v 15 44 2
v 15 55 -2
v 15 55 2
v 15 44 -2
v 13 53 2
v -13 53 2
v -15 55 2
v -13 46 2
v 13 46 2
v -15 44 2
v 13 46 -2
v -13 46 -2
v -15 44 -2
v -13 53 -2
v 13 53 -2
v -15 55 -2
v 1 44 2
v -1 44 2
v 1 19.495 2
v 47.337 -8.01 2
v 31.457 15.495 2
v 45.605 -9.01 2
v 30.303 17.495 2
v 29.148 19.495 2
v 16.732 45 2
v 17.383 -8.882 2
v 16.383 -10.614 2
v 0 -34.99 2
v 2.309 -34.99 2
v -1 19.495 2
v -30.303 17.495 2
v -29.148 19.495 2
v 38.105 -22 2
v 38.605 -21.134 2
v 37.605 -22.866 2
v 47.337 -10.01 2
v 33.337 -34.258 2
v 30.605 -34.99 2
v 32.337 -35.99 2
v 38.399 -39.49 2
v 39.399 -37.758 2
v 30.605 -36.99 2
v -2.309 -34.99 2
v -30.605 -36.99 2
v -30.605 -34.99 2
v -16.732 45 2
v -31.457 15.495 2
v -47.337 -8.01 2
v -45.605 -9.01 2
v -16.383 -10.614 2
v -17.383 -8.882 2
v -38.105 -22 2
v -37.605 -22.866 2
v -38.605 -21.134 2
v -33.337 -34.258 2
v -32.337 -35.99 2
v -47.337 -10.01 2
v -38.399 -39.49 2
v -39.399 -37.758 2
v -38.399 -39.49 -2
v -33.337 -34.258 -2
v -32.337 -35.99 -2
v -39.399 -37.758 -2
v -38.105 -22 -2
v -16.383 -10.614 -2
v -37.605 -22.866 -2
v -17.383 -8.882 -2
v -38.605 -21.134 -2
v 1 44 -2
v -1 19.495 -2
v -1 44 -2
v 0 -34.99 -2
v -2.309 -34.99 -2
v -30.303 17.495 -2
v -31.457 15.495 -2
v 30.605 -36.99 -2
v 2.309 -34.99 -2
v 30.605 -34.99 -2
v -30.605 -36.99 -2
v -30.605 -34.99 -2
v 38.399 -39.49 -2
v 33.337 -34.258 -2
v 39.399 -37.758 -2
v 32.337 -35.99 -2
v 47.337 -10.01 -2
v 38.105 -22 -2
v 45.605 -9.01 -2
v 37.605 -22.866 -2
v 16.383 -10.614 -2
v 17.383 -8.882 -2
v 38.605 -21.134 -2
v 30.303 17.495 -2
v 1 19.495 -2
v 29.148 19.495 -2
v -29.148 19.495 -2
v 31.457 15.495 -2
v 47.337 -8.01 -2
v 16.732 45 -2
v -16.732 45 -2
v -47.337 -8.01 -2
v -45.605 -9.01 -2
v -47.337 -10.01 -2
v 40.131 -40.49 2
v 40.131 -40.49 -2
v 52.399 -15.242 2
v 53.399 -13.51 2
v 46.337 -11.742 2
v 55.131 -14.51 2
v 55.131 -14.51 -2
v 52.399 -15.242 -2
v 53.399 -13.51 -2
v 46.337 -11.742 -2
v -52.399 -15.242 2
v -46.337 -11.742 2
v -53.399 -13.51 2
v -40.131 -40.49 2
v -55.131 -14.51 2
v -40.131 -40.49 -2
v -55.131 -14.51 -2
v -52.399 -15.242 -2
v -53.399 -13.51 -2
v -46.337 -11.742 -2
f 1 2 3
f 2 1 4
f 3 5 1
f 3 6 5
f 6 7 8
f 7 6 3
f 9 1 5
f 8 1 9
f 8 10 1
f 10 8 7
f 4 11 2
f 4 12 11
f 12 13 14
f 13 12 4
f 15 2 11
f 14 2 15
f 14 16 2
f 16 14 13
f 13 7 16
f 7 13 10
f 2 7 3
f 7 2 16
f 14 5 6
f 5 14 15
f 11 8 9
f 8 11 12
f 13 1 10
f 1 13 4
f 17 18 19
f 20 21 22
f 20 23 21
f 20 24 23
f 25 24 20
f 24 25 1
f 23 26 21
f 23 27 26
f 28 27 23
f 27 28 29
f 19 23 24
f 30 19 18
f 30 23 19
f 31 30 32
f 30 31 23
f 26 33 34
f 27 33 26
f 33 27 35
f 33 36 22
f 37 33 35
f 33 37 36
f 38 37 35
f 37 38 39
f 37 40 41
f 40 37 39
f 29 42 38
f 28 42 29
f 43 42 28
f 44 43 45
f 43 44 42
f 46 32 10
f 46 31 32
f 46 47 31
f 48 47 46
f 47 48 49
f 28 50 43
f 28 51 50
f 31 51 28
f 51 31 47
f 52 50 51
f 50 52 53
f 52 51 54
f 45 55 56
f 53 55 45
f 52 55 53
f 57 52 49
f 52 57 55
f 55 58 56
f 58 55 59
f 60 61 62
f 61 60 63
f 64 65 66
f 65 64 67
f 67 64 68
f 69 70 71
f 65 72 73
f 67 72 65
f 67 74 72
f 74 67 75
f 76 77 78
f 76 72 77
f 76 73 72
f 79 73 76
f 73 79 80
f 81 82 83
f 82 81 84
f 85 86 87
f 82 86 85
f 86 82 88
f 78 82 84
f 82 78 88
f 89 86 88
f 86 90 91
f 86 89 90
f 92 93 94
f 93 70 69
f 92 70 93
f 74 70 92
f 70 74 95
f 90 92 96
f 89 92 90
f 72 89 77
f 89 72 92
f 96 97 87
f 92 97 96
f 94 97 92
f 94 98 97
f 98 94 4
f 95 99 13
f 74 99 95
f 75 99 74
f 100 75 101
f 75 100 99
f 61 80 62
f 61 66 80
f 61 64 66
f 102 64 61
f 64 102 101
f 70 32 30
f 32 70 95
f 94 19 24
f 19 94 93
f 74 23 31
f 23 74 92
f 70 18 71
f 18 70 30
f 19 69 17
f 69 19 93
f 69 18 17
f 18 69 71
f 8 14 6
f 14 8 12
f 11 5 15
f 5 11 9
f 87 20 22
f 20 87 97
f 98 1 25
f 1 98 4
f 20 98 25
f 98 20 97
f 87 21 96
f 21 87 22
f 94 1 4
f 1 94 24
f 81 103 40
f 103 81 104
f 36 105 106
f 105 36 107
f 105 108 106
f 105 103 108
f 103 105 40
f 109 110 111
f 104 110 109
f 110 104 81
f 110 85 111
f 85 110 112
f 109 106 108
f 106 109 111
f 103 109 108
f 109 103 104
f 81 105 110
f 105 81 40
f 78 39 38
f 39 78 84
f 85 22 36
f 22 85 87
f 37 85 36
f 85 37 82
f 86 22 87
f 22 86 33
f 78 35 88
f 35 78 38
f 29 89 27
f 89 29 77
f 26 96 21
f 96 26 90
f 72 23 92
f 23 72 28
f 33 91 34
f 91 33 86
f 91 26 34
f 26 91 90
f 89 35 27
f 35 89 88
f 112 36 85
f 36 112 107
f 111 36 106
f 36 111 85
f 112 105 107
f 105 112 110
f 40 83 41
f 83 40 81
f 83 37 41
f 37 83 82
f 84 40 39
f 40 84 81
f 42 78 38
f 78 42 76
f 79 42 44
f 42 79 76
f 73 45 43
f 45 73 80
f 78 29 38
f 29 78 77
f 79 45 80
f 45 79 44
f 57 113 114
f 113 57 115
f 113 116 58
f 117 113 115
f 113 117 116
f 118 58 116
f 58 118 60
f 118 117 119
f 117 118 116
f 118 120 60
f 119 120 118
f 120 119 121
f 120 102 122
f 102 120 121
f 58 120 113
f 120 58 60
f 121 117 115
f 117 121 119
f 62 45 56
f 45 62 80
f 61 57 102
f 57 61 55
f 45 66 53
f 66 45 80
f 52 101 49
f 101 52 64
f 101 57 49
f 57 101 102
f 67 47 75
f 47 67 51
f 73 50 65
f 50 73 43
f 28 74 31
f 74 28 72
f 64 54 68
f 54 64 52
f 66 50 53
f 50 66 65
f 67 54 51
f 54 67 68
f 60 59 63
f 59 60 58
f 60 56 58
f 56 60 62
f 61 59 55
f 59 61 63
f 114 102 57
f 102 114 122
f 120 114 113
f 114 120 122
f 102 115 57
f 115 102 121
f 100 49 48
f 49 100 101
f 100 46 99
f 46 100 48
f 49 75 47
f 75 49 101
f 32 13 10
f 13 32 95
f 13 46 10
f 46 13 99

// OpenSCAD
// Generated by SolidPython 1.1.3 on 2023-10-16 15:38:50
$fn = 48;


union() {
	union() {
		color(alpha = 1.0000000000, c = "Red") {
			translate(v = [ 0.,54., 0.]) {
				rotate(a = [0, 0, -0.0000000000]) {
					cube(center = true, size = [30, 2, 4]);
				}
			}
		}
	}
	union() {
		color(alpha = 1.0000000000, c = "Orange") {
			translate(v = [ 0.,45., 0.]) {
				rotate(a = [0, 0, -0.0000000000]) {
					cube(center = true, size = [30, 2, 4]);
				}
			}
		}
	}
	union() {
		color(alpha = 1.0000000000, c = "Yellow") {
			translate(v = [ 0.        ,18.49519053, 0.        ]) {
				rotate(a = [0, 0, -0.0000000000]) {
					cube(center = true, size = [60.605117766515306, 2, 4]);
				}
			}
		}
	}
	union() {
		color(alpha = 1.0000000000, c = "Green") {
			translate(v = [ 0.        ,31.74759526, 0.        ]) {
				rotate(a = [0, 0, 90.0000000000]) {
					cube(center = true, size = [24.504809471616706, 2, 4]);
				}
			}
		}
	}
	union() {
		color(alpha = 1.0000000000, c = "Blue") {
			translate(v = [-14. , 49.5,  0. ]) {
				rotate(a = [0, 0, 90.0000000000]) {
					cube(center = true, size = [7, 2, 4]);
				}
			}
		}
	}
	union() {
		color(alpha = 1.0000000000, c = "Blue") {
			translate(v = [14. ,49.5, 0. ]) {
				rotate(a = [0, 0, 90.0000000000]) {
					cube(center = true, size = [7, 2, 4]);
				}
			}
		}
	}
	union() {
		color(alpha = 1.0000000000, c = "Purple") {
			translate(v = [31.16858429,17.99519053, 0.        ]) {
				rotate(a = [0, 0, -60.0000000000]) {
					cube(center = true, size = [61.2102355330306, 2, 4]);
				}
			}
		}
	}
	union() {
		color(alpha = 1.0000000000, c = "Red") {
			translate(v = [ 46.7653718,-27.       ,  0.       ]) {
				rotate(a = [0, 0, -120.0000000000]) {
					cube(center = true, size = [30, 2, 4]);
				}
			}
		}
	}
	union() {
		color(alpha = 1.0000000000, c = "Orange") {
			translate(v = [ 38.97114317,-22.5       ,  0.        ]) {
				rotate(a = [0, 0, -120.0000000000]) {
					cube(center = true, size = [30, 2, 4]);
				}
			}
		}
	}
	union() {
		color(alpha = 1.0000000000, c = "Yellow") {
			translate(v = [16.01730485,-9.24759526, 0.        ]) {
				rotate(a = [0, 0, -120.0000000000]) {
					cube(center = true, size = [60.605117766515306, 2, 4]);
				}
			}
		}
	}
	union() {
		color(alpha = 1.0000000000, c = "Green") {
			translate(v = [ 27.49422401,-15.87379763,  0.        ]) {
				rotate(a = [0, 0, -30.0000000000]) {
					cube(center = true, size = [24.504809471616706, 2, 4]);
				}
			}
		}
	}
	union() {
		color(alpha = 1.0000000000, c = "Blue") {
			translate(v = [ 49.86825749,-12.62564435,  0.        ]) {
				rotate(a = [0, 0, -30.0000000000]) {
					cube(center = true, size = [7, 2, 4]);
				}
			}
		}
	}
	union() {
		color(alpha = 1.0000000000, c = "Blue") {
			translate(v = [ 35.86825749,-36.87435565,  0.        ]) {
				rotate(a = [0, 0, -30.0000000000]) {
					cube(center = true, size = [7, 2, 4]);
				}
			}
		}
	}
	union() {
		color(alpha = 1.0000000000, c = "Purple") {
			translate(v = [ 4.40755050e-15,-3.59903811e+01, 0.00000000e+00]) {
				rotate(a = [0, 0, -180.0000000000]) {
					cube(center = true, size = [61.2102355330306, 2, 4]);
				}
			}
		}
	}
	union() {
		color(alpha = 1.0000000000, c = "Red") {
			translate(v = [-46.7653718,-27.       ,  0.       ]) {
				rotate(a = [0, 0, -240.0000000000]) {
					cube(center = true, size = [30, 2, 4]);
				}
			}
		}
	}
	union() {
		color(alpha = 1.0000000000, c = "Orange") {
			translate(v = [-38.97114317,-22.5       ,  0.        ]) {
				rotate(a = [0, 0, -240.0000000000]) {
					cube(center = true, size = [30, 2, 4]);
				}
			}
		}
	}
	union() {
		color(alpha = 1.0000000000, c = "Yellow") {
			translate(v = [-16.01730485, -9.24759526,  0.        ]) {
				rotate(a = [0, 0, -240.0000000000]) {
					cube(center = true, size = [60.605117766515306, 2, 4]);
				}
			}
		}
	}
	union() {
		color(alpha = 1.0000000000, c = "Green") {
			translate(v = [-27.49422401,-15.87379763,  0.        ]) {
				rotate(a = [0, 0, -150.0000000000]) {
					cube(center = true, size = [24.504809471616706, 2, 4]);
				}
			}
		}
	}
	union() {
		color(alpha = 1.0000000000, c = "Blue") {
			translate(v = [-35.86825749,-36.87435565,  0.        ]) {
				rotate(a = [0, 0, -150.0000000000]) {
					cube(center = true, size = [7, 2, 4]);
				}
			}
		}
	}
	union() {
		color(alpha = 1.0000000000, c = "Blue") {
			translate(v = [-49.86825749,-12.62564435,  0.        ]) {
				rotate(a = [0, 0, -150.0000000000]) {
					cube(center = true, size = [7, 2, 4]);
				}
			}
		}
	}
	union() {
		color(alpha = 1.0000000000, c = "Purple") {
			translate(v = [-31.16858429, 17.99519053,  0.        ]) {
				rotate(a = [0, 0, -300.0000000000]) {
					cube(center = true, size = [61.2102355330306, 2, 4]);
				}
			}
		}
	}
}
/***********************************************
*********      SolidPython code:      **********
************************************************
 
#! /usr/bin/env python3
import sys
import numpy as np
from solid import scad_render_to_file
from solid.objects import cube, translate, union, rotate, color

SEGMENTS = 48

radial_vector0 = np.array([ 31., -19., 0.])
radial_vector0 /= np.linalg.norm(radial_vector0)
radial_vector1 = np.array([-31., -19., 0.])
radial_vector1 /= np.linalg.norm(radial_vector1)

side_count = 3
step_angle = 360/side_count
step_angle_rad = np.deg2rad(step_angle)
rad_size = 30 # Length from center to outer wheel
piece_width = 2 # cm
hpw = piece_width*.5

wheel_gap = 9
ctiw = 44 # Center to inner wheel support
ctow = wheel_gap+ctiw # Center to outer wheel support
wsl = 30 # Wheel support length

p1 = np.array([wsl*.5, ctiw, 0.])
p2 = np.array([np.sin(step_angle_rad), np.cos(step_angle_rad), 0.]) * ctiw - np.array([np.sin(step_angle_rad+np.pi*.5), np.cos(step_angle_rad+np.pi*.5), 0.]) * wsl*.5
boll = np.linalg.norm(p1-p2) # Big outer lines length
bolr = np.linalg.norm((p1+p2)*.5)# Big outer lines rad length

# Circular inner support
p3 = (p1+p2)*.5
p2 = np.array([-np.sin(step_angle_rad), np.cos(step_angle_rad), 0.]) * ctiw - np.array([-np.sin(step_angle_rad+np.pi*.5), np.cos(step_angle_rad+np.pi*.5), 0.]) * wsl*.5
p1 = np.array([-wsl*.5, ctiw, 0.])
p4 = (p1+p2)*.5
cil = np.linalg.norm(p3-p4) # Big outer lines length
cir = np.linalg.norm((p3+p4)*.5)# Big outer lines rad length

# Radial connections
p1 = np.array([0, ctiw, 0.])
p2 = (p4+p3)*.5
rcl = np.linalg.norm(p1-p2) - piece_width
rcr = np.linalg.norm((p1+p2)*.5)

# Wheel side support
wssl = wheel_gap - piece_width

def rotate_vec(vec, angle):
    angle = np.deg2rad(angle)
    new_vec = np.copy(vec)
    new_vec[0] = vec[0] * np.cos(angle) - vec[1] * np.sin(angle)
    new_vec[1] = vec[0] * np.sin(angle) + vec[1] * np.cos(angle)
    return new_vec

def basic_geometry():

    shapes = []
    for i in range(side_count):
        dir_vector = np.array([np.sin(i*step_angle_rad), np.cos(i*step_angle_rad), 0.])
        rot = -step_angle*i
        outer_wheel_support = union()(
                                color("Red")(
                                    translate(dir_vector*(ctow+hpw))(
                                        rotate((0, 0, rot))(
                                            cube([wsl, 2, 4], center=True)))))
        shapes.append(outer_wheel_support)
        inner_wheel_support = union()(
                                color("Orange")(
                                    translate(dir_vector*(ctiw+hpw))(
                                        rotate((0, 0, rot))(
                                            cube([wsl, 2, 4], center=True)))))
        shapes.append(inner_wheel_support)

        inner_circle = union()(
                            color("Yellow")(
                                translate(dir_vector*(cir+hpw))(
                                    rotate((0, 0, rot))(
                                        cube([cil, 2, 4], center=True)))))
        shapes.append(inner_circle)

        radial_support = union()(
                            color("Green")(
                                translate(dir_vector*(rcr+hpw))(
                                    rotate((0, 0, rot+90))(
                                        cube([rcl, 2, 4], center=True)))))
        shapes.append(radial_support)

        wheel_side_support_l = union()(
                                    color("Blue")(
                                        translate(dir_vector*(ctiw+hpw)+rotate_vec(np.array([-wsl*.5+hpw, wheel_gap*.5, 0.]), rot))(
                                            rotate((0, 0, rot+90))(
                                                cube([wssl, 2, 4], center=True)))))
        wheel_side_support_r = union()(
                                    color("Blue")(
                                        translate(dir_vector*(ctiw+hpw)+rotate_vec(np.array([wsl*.5-hpw, wheel_gap*.5, 0.]), rot))(
                                            rotate((0, 0, rot+90))(
                                                cube([wssl, 2, 4], center=True)))))
        shapes.append(wheel_side_support_l)
        shapes.append(wheel_side_support_r)

        dir_vector = np.array([np.sin(i*step_angle_rad+step_angle_rad*.5), np.cos(i*step_angle_rad+step_angle_rad*.5), 0.])
        rot -= step_angle*.5
        big_outer_line = union()(
                            color("Purple")(
                                translate(dir_vector*(bolr+hpw))(
                                    rotate((0, 0, rot))(
                                        cube([boll, 2, 4], center=True)))))
        shapes.append(big_outer_line)

    print(f"Red:         {wsl:.1f} cm")
    print(f"Orange:      {wsl:.1f} cm")
    print(f"Yellow:      {cil:.1f} cm - angle cut")
    print(f"Green:       {rcl:.1f} cm")
    print(f"Blue:         {wssl:.1f} cm")
    print(f"Purple:      {boll:.1f} cm")
    print("--------------------------")
    print(f"Diameter:   {(np.linalg.norm(np.array([wsl*.5, ctow]))*2):.1f} cm")

    return union()(*shapes)

if __name__ == '__main__':
    out_dir = sys.argv[1] if len(sys.argv) > 1 else None

    a = basic_geometry()

    # Adding the file_header argument as shown allows you to change
    # the detail of arcs by changing the SEGMENTS variable.  This can
    # be expensive when making lots of small curves, but is otherwise
    # useful.
    file_out = scad_render_to_file(a, out_dir=out_dir, file_header=f'$fn = {SEGMENTS};')
    print(f"{__file__}: SCAD file written to: \n{file_out}")
 
 
************************************************/
